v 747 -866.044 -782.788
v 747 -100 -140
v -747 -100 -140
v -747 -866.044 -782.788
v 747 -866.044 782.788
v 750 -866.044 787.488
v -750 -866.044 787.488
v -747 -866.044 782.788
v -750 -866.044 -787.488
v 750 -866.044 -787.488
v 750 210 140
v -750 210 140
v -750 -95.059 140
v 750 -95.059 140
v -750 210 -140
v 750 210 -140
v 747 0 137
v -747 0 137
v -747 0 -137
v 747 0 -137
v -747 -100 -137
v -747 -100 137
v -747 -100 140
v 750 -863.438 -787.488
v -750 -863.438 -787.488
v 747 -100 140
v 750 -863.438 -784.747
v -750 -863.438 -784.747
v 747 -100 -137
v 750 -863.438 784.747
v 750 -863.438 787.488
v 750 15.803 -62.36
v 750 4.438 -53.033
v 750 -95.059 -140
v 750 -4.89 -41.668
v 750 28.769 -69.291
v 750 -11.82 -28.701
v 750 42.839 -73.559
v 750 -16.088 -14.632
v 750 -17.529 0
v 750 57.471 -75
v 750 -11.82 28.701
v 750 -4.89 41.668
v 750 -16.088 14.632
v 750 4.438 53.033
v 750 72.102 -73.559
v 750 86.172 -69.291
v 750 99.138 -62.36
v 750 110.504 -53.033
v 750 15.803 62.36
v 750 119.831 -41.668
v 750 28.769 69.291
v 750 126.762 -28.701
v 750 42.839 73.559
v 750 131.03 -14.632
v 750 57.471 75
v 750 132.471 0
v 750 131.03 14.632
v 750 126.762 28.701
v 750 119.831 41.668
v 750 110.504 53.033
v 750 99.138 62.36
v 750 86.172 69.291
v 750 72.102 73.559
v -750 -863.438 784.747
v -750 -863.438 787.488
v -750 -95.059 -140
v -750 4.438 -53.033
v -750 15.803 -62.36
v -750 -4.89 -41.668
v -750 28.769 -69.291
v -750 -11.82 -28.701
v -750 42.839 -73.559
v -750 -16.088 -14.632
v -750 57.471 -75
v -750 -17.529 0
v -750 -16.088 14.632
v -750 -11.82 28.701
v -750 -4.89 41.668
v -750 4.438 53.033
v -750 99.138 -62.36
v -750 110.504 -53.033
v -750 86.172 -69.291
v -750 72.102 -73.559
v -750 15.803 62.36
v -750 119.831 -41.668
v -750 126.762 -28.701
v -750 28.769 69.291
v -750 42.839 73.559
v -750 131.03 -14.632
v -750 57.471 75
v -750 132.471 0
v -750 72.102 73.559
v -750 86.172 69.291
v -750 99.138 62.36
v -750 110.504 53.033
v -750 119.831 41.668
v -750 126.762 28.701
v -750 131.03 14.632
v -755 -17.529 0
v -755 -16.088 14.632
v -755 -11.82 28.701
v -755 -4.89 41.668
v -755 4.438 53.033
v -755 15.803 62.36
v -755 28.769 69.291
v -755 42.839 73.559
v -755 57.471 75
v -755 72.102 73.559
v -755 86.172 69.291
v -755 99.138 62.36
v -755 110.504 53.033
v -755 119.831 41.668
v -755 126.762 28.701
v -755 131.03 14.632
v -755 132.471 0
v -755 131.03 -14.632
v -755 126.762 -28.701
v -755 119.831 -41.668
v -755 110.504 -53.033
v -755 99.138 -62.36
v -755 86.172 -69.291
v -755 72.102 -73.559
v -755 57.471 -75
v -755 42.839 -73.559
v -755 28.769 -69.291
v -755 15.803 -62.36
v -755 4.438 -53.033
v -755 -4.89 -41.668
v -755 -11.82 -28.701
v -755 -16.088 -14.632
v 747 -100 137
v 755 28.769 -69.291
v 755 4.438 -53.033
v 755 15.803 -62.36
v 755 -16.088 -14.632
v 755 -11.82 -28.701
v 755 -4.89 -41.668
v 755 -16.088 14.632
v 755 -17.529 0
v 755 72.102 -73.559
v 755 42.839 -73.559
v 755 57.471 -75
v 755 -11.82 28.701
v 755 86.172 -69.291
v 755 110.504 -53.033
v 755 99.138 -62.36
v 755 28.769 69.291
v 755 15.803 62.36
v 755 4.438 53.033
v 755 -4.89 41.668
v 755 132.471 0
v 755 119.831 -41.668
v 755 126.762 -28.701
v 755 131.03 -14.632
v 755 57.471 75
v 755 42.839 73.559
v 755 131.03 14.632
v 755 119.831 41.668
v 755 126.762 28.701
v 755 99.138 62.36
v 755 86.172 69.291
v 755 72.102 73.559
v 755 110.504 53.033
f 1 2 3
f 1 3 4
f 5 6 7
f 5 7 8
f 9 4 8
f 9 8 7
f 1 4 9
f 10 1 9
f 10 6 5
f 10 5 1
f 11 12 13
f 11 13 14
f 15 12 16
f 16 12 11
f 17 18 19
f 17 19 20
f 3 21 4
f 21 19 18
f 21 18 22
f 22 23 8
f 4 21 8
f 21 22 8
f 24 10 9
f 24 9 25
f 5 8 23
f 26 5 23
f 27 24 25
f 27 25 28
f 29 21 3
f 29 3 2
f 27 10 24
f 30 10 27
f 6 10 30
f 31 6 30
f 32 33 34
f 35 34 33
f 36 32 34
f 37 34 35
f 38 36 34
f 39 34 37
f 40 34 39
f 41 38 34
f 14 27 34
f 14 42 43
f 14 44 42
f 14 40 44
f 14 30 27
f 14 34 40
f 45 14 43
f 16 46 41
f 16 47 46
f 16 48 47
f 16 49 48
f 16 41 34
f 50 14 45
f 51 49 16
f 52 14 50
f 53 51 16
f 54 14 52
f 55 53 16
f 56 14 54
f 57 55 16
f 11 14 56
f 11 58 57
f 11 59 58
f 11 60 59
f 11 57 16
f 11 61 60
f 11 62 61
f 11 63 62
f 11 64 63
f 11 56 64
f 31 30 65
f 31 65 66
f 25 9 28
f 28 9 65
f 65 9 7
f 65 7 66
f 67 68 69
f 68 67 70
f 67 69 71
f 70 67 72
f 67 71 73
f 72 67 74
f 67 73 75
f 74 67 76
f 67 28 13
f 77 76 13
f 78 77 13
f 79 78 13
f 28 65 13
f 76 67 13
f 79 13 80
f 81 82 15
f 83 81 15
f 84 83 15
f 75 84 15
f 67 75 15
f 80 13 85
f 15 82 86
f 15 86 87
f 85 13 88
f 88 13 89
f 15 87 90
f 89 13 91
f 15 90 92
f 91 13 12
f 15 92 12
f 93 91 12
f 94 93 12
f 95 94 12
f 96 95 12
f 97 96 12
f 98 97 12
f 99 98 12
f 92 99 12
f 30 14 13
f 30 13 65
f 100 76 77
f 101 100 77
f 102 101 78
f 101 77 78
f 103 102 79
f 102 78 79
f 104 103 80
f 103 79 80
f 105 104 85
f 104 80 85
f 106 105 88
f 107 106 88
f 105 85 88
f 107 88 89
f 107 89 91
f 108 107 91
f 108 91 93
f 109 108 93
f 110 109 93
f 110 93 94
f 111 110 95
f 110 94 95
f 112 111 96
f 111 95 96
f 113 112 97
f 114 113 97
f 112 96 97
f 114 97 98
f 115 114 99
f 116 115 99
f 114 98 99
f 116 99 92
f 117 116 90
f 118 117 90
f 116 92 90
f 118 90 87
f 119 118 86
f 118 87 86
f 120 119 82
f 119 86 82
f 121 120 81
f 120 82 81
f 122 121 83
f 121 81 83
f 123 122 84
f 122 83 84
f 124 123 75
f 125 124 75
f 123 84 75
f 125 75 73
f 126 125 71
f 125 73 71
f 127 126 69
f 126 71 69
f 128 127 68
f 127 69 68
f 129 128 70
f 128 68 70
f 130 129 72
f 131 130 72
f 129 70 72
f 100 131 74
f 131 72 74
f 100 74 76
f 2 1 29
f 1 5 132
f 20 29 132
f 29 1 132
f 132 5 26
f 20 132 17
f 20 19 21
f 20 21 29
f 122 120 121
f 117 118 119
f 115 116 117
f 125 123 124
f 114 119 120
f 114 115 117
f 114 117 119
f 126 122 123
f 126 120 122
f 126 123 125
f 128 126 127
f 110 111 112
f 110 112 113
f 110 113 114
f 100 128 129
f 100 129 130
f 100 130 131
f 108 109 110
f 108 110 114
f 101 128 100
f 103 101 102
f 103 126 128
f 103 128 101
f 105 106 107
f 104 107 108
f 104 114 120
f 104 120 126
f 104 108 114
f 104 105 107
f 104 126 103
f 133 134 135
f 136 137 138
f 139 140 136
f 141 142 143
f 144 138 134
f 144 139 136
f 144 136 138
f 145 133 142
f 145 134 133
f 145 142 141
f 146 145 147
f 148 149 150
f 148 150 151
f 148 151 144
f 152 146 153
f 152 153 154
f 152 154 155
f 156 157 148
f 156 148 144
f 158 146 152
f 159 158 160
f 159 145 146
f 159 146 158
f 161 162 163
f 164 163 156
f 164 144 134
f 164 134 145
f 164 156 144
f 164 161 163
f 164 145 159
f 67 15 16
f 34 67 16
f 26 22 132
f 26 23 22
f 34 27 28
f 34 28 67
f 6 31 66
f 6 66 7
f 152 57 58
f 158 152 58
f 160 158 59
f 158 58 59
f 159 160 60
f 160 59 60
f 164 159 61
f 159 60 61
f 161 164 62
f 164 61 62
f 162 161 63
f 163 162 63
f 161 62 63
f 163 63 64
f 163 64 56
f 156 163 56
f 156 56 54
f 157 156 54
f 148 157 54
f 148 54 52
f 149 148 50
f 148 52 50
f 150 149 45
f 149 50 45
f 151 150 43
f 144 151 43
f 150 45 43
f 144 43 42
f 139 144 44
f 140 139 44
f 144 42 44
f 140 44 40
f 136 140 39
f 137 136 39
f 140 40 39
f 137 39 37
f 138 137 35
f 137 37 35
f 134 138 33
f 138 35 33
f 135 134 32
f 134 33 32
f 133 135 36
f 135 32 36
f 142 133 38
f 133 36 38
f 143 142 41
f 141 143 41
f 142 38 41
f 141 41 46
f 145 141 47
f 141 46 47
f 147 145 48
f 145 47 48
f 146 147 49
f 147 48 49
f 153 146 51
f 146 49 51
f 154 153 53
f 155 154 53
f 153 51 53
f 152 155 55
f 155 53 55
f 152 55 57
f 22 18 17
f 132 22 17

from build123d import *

# Parameters (mm, degrees)
F0_W      = 1500
F0_H      = 280
F1_DEPTH  = 210
F2_W      = 1500
F2_H      = 280
F2_W_2    = 1494
F2_H_2    = 274
F3_DEPTH  = 100
F5_DEPTH  = 1500
F6_R      = 75
F7_DEPTH  = 5
F8_R      = 75
F9_DEPTH  = 5
F11_DEPTH = 3
F13_DEPTH = 3


with BuildPart() as f1:
    # F0 (on Front) → F1 (new body)
    with BuildSketch(Plane.XZ):
        Rectangle(F0_W, F0_H)
    extrude(amount=-F1_DEPTH)

    # F2 (on face) → F3 (join)
    with BuildSketch(Plane.XZ):
        Rectangle(F2_W, F2_H)
        Rectangle(F2_W_2, F2_H_2, mode=Mode.SUBTRACT)
    extrude(amount=F3_DEPTH)

    # F4 (on face) → F5 (join)
    with BuildSketch(Plane.YZ.offset(750)):
        Polygon((-866.044443, 782.78761), (-100, 140), (-95.058616, 140), (-863.438088, 784.746932), (-863.438088, 787.488366), (-866.044443, 787.488366), align=None)
        Polygon((-95.058616, -140), (-100, -140), (-866.044443, -782.78761), (-866.044443, -787.488366), (-863.438088, -787.488366), (-863.438088, -784.746932), align=None)
    extrude(amount=-F5_DEPTH)

    # F6 (on face) → F7 (join)
    with BuildSketch(Plane.YZ.offset(750)):
        with Locations((57.470692, 0)):
            Circle(F6_R)
    extrude(amount=F7_DEPTH)

    # F8 (on face) → F9 (join)
    with BuildSketch(Plane(origin=(-750, 0, 0), x_dir=(0, -1, 0), z_dir=(-1, 0, 0))):
        with Locations((-57.470692, 0)):
            Circle(F8_R)
    extrude(amount=F9_DEPTH)

    # F10 (on face) → F11 (join)
    with BuildSketch(Plane(origin=(-750, 0, 0), x_dir=(0, -1, 0), z_dir=(-1, 0, 0))):
        Polygon((866.044443, 787.488366), (863.438088, 787.488366), (863.438088, 784.746932), (95.058616, 140), (100, 140), (100, -140), (95.058616, -140), (863.438088, -784.746932), (863.438088, -787.488366), (866.044443, -787.488366), (866.044443, -782.78761), (866.044443, 782.78761), align=None)
    extrude(amount=-F11_DEPTH)

    # F12 (on face) → F13 (join)
    with BuildSketch(Plane.YZ.offset(750)):
        Polygon((-866.044443, -782.78761), (-866.044443, -787.488366), (-863.438088, -787.488366), (-863.438088, -784.746932), (-95.058616, -140), (-100, -140), (-100, 140), (-95.058616, 140), (-863.438088, 784.746932), (-863.438088, 787.488366), (-866.044443, 787.488366), (-866.044443, 782.78761), align=None)
    extrude(amount=-F13_DEPTH)


solid = f1.part
